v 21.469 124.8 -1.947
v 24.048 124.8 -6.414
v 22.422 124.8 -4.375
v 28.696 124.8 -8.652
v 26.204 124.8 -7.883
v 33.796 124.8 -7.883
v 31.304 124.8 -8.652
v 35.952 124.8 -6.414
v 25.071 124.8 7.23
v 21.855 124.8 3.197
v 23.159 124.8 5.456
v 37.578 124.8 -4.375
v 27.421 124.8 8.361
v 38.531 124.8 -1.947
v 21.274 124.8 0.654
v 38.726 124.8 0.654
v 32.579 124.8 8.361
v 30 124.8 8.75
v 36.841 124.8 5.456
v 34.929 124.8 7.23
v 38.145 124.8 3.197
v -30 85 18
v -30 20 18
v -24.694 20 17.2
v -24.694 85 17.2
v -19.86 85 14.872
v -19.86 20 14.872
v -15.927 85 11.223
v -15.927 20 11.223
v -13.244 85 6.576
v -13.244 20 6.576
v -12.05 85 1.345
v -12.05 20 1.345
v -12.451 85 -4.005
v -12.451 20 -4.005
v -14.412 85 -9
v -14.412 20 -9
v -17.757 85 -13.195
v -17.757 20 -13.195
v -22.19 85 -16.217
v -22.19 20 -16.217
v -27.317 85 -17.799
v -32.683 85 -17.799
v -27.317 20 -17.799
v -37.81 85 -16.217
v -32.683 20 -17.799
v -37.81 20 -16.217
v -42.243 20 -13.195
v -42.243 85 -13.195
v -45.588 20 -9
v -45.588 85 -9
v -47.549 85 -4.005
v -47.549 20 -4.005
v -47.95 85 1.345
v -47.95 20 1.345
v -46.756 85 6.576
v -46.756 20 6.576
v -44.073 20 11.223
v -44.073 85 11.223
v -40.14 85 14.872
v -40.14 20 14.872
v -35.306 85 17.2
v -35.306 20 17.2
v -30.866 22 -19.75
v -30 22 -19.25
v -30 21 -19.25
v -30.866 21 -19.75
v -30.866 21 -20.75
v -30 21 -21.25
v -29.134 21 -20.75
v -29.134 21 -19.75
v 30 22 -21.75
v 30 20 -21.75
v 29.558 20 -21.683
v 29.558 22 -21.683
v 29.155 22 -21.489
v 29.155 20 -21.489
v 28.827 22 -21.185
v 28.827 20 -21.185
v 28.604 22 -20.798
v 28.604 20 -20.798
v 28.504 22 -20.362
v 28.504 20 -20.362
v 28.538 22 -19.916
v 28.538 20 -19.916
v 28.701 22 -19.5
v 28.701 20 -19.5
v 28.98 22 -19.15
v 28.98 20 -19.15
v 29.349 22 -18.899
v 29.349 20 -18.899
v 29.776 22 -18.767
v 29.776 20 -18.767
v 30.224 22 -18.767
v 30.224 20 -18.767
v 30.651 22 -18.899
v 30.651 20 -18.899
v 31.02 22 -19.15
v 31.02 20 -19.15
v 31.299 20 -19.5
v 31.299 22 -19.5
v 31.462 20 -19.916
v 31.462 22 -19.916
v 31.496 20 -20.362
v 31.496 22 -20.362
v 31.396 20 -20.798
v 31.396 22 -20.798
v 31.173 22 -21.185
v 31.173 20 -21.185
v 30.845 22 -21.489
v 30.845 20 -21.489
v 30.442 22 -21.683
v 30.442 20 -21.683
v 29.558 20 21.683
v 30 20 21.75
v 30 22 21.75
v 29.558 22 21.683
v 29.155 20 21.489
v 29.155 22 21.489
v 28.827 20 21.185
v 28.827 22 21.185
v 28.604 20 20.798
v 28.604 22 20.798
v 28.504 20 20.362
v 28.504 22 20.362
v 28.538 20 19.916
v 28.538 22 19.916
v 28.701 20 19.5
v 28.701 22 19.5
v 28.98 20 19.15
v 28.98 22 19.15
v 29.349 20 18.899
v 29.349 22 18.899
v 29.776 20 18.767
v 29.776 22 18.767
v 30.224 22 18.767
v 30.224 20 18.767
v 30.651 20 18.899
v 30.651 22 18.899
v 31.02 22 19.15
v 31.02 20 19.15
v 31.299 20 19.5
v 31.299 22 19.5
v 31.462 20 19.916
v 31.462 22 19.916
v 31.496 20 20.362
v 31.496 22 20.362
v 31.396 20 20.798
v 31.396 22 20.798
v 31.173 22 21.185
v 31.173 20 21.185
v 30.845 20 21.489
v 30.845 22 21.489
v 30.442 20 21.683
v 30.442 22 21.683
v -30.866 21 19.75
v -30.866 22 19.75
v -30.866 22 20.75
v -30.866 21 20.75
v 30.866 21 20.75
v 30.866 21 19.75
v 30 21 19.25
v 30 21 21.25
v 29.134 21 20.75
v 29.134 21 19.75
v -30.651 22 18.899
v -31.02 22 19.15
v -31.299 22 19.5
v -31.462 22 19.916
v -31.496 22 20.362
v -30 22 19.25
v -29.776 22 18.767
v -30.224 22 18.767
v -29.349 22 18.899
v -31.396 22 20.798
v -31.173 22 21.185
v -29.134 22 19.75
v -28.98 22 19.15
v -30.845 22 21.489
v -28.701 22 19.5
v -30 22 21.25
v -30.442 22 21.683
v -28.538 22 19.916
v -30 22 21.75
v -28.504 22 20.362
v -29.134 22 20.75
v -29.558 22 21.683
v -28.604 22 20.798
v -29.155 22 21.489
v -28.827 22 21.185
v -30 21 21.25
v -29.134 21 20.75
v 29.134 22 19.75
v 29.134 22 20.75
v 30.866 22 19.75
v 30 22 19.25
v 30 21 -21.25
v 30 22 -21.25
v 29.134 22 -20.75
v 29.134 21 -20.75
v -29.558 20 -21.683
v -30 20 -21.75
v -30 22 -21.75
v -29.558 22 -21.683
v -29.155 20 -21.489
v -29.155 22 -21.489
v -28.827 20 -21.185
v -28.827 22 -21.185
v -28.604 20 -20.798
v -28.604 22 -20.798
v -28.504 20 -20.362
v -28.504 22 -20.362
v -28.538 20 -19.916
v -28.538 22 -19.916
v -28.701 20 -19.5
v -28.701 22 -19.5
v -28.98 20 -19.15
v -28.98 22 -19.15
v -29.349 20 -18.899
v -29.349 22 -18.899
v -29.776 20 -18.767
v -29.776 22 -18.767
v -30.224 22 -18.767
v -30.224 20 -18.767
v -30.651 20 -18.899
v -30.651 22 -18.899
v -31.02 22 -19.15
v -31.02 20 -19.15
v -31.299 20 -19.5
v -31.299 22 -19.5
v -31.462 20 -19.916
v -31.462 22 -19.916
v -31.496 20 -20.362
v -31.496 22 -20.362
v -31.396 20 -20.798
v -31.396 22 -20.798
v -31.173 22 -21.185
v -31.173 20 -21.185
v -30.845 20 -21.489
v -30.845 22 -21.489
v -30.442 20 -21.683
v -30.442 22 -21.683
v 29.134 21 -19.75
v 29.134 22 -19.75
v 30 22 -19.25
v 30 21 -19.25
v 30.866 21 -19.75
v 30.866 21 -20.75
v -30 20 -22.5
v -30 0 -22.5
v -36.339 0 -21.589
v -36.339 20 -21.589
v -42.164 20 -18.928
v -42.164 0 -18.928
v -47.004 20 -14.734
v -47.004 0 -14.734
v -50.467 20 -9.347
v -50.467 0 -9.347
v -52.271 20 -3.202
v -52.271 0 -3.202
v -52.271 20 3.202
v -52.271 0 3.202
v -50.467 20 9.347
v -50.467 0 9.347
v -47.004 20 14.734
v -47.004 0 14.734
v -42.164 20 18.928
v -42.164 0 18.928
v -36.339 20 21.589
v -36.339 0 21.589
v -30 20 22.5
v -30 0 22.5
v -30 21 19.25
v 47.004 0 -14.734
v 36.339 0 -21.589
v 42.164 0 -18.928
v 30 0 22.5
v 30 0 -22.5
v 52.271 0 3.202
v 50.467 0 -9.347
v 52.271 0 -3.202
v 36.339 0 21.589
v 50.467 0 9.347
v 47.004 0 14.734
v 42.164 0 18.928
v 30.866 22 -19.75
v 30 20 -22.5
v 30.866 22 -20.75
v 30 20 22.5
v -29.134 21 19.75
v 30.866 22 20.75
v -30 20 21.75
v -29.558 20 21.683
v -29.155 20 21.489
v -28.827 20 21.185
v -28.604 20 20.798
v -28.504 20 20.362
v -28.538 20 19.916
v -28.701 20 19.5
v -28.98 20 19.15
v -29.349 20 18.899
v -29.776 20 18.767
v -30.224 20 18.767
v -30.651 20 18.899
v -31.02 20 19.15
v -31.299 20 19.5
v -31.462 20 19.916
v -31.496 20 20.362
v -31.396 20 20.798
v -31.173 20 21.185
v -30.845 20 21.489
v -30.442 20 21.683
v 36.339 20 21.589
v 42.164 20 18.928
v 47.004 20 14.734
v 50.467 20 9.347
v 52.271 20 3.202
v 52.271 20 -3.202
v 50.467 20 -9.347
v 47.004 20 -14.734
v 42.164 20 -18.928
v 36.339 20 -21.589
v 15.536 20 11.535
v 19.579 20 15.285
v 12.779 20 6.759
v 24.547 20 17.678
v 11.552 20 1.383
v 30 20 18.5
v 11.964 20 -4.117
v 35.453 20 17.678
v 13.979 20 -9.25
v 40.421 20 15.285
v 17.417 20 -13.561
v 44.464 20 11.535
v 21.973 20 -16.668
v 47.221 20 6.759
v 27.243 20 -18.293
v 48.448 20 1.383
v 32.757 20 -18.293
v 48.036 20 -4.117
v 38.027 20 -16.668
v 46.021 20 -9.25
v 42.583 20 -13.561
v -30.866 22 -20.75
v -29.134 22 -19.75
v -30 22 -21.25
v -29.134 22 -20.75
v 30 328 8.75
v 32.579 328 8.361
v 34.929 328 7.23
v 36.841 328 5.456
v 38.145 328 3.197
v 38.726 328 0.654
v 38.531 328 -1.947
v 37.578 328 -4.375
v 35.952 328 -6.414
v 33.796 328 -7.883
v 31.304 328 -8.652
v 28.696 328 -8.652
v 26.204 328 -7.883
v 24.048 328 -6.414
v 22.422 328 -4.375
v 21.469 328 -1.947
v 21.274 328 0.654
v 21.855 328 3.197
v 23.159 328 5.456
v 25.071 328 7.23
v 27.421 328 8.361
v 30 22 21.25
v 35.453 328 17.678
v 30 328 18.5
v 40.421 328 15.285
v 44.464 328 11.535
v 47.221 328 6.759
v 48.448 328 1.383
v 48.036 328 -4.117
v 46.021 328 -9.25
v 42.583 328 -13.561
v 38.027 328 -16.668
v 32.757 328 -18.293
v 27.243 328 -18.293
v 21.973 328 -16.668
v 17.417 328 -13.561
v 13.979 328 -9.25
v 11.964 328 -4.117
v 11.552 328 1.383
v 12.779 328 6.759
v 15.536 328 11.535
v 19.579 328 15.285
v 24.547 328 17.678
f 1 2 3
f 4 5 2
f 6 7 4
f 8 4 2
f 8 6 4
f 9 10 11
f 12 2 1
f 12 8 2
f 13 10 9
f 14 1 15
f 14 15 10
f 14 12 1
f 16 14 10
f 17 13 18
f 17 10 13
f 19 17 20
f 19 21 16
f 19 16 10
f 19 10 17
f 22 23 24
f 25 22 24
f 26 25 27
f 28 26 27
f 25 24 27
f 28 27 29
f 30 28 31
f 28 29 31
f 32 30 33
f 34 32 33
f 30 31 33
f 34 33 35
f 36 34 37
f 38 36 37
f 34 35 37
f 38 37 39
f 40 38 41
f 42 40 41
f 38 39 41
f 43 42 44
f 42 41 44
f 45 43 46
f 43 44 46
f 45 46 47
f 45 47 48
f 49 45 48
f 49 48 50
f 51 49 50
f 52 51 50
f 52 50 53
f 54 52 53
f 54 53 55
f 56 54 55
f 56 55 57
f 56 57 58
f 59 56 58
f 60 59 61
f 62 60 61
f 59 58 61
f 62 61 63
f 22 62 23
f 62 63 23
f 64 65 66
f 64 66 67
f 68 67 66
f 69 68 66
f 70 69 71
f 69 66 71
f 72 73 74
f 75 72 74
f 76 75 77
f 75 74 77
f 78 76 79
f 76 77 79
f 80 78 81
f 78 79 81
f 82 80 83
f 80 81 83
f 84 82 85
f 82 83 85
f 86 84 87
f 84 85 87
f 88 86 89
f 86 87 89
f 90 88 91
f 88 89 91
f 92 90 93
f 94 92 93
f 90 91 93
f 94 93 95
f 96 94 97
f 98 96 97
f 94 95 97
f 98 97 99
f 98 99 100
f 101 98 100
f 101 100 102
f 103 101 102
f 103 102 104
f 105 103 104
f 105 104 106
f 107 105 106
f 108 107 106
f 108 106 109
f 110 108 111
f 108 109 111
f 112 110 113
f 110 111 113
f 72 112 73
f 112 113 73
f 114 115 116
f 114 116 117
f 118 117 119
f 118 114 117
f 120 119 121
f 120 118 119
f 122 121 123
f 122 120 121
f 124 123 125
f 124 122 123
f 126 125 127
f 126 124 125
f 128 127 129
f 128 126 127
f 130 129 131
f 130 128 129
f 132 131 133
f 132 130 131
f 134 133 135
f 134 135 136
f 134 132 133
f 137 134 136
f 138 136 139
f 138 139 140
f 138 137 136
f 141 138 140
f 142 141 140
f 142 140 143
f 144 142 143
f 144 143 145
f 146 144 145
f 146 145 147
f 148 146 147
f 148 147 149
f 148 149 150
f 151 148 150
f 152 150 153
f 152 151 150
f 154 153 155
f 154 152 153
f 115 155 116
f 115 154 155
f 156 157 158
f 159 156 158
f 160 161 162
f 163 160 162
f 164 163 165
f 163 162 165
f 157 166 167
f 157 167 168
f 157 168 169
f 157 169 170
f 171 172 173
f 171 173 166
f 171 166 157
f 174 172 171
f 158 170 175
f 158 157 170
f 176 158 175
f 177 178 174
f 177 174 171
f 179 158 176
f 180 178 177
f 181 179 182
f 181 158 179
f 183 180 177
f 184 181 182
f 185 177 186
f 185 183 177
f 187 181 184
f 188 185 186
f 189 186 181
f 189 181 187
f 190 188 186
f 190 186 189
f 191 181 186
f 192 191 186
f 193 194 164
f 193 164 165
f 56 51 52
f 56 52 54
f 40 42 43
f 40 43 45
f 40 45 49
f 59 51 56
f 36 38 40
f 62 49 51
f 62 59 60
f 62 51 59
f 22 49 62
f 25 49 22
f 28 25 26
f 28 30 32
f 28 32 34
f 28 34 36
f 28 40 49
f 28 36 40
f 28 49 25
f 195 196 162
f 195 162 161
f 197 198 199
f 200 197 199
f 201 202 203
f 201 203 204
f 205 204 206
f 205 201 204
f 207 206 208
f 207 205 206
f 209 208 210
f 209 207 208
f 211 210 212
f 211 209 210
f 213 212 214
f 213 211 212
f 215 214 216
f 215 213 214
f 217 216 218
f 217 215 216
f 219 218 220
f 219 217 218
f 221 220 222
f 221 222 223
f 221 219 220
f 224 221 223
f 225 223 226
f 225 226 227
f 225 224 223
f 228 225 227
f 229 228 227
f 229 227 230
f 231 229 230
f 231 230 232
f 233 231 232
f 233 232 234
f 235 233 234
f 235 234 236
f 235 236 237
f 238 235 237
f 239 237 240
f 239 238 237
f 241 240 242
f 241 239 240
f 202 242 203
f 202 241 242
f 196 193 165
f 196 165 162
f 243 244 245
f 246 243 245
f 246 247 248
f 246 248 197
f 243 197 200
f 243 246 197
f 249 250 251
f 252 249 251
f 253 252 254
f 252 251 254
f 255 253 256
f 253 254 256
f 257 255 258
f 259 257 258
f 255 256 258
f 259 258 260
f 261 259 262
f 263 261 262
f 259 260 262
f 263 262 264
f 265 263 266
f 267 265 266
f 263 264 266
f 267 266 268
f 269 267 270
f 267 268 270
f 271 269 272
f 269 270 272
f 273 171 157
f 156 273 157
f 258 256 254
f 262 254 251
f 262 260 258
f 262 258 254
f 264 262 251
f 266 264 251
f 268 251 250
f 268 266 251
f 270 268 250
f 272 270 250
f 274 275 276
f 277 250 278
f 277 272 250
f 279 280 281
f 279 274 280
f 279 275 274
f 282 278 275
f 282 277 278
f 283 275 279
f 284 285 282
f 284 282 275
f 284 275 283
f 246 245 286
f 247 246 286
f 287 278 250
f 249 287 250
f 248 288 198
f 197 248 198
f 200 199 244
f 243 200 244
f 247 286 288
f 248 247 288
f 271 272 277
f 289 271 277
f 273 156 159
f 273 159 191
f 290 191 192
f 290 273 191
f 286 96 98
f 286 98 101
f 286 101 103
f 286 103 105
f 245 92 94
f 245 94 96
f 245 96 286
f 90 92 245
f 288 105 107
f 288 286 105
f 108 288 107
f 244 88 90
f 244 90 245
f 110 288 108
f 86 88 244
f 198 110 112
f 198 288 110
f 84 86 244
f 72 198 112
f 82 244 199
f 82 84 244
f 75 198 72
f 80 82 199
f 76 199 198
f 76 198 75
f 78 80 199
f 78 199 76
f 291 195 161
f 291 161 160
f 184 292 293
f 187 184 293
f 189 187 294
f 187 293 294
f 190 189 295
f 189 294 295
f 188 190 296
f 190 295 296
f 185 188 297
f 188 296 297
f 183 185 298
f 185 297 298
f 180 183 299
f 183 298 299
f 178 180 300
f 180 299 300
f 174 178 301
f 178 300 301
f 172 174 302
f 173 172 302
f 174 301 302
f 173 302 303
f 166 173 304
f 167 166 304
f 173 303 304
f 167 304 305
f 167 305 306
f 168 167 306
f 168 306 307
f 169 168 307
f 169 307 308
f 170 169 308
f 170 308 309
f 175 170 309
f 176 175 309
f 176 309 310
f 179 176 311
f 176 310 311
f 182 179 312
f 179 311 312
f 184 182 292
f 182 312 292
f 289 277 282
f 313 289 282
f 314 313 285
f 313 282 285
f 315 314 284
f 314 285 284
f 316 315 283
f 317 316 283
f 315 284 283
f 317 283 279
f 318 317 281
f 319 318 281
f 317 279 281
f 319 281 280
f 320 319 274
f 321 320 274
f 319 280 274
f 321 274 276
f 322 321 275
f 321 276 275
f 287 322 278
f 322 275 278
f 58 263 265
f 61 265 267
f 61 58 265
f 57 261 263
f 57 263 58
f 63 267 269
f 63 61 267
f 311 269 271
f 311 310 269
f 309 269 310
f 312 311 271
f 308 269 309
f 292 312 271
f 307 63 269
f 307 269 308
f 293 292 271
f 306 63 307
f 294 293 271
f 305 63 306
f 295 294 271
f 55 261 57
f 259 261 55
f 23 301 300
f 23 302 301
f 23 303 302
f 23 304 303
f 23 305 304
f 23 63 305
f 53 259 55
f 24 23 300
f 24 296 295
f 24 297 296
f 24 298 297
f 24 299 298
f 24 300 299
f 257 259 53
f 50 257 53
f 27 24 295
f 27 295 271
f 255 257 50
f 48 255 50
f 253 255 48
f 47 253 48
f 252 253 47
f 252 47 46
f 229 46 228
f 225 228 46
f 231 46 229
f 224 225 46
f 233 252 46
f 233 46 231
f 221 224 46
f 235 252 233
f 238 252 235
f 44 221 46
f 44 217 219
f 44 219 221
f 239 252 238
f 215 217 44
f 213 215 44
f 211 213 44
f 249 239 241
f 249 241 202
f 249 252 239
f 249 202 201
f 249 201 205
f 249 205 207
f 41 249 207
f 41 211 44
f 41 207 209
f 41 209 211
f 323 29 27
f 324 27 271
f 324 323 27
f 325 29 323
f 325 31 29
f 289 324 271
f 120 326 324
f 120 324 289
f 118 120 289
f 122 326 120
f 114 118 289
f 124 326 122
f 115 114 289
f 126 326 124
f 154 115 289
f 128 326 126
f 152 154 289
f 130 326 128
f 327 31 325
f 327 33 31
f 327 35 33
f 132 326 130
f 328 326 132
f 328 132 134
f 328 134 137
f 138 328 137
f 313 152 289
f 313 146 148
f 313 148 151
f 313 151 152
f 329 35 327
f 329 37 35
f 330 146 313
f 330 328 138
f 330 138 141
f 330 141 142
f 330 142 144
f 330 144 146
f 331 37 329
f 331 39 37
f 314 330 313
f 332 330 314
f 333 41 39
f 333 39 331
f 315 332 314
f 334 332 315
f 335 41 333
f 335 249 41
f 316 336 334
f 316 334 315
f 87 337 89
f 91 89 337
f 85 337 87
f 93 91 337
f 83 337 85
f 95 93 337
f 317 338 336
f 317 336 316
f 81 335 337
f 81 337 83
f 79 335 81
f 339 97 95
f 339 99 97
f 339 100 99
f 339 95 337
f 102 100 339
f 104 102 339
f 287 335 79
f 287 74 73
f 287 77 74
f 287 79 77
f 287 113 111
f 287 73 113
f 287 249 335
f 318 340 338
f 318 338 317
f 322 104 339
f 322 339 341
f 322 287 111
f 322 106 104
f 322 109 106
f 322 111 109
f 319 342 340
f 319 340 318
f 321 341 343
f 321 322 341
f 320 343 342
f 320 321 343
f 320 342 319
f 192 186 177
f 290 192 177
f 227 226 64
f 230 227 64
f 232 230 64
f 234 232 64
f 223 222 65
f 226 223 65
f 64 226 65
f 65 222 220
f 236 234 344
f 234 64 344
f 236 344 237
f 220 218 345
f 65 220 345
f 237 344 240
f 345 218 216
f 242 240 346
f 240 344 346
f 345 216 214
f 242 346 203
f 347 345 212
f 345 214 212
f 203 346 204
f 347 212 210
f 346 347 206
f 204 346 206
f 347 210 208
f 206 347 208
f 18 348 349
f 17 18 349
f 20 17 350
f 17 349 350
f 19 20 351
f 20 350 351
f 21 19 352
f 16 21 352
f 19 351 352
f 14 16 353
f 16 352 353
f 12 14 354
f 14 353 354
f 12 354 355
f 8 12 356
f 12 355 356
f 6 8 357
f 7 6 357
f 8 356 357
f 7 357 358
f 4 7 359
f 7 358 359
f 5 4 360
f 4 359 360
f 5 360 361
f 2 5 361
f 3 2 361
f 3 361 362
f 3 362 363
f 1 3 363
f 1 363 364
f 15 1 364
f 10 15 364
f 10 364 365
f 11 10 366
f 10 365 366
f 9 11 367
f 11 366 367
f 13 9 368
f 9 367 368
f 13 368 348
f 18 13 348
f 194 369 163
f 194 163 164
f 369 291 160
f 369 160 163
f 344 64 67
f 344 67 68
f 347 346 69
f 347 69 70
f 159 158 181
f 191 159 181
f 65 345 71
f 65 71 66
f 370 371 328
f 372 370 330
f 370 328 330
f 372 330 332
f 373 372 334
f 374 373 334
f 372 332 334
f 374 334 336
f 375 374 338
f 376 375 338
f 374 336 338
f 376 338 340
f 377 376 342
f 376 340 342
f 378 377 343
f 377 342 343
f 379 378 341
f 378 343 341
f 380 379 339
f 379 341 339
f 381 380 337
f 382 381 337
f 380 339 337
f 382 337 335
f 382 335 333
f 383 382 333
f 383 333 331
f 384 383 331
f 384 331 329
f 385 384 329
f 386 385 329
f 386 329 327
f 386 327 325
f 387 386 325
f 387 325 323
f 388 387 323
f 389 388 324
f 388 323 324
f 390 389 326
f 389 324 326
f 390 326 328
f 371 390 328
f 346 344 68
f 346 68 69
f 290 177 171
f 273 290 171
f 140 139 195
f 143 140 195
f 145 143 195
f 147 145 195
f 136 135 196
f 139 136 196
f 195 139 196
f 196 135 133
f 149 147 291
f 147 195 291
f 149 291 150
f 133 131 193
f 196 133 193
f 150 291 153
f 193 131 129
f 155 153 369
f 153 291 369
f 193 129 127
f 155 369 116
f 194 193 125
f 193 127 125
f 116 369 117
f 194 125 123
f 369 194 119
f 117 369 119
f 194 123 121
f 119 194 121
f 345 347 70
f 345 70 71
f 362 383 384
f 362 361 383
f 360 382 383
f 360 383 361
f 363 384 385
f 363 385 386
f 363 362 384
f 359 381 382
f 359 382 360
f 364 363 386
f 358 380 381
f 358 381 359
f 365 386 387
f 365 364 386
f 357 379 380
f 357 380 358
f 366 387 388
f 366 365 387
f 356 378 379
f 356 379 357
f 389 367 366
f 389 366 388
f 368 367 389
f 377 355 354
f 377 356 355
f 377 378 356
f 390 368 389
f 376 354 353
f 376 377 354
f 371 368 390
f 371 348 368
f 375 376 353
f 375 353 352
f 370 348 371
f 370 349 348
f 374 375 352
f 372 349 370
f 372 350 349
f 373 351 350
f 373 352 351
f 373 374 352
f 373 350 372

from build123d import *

# Parameters (mm, degrees)
BOSS_EXTRUDE1_DEPTH     = 20
SKETCH2_R               = 18
BOSS_EXTRUDE2_DEPTH     = 65
SKETCH3_R               = 18.5
BOSS_EXTRUDE3_DEPTH     = 308
SKETCH4_R               = 8.75
CUT_EXTRUDE1_DEPTH      = 203.2
SKETCH8_R               = 1
CUT_EXTRUDE2_DEPTH      = 20
SKETCH9_R               = 1.5
BOSS_EXTRUDE4_DEPTH     = 2
CUT_EXTRUDE3_DEPTH      = 1
SKETCH11_R              = 1
BOSS_EXTRUDE5_DEPTH     = 20
MIRROR2_COPY_1_SKETCH_R = 1
MIRROR2_COPY_1_DEPTH    = 20
MIRROR2_COPY_2_SKETCH_R = 1.5
MIRROR2_COPY_2_DEPTH    = 2
MIRROR2_COPY_3_DEPTH    = 1
MIRROR2_COPY_4_SKETCH_R = 1
MIRROR2_COPY_4_DEPTH    = 20
MIRROR2_COPY_5_SKETCH_R = 1
MIRROR2_COPY_5_DEPTH    = 20
MIRROR2_COPY_6_SKETCH_R = 1
MIRROR2_COPY_6_DEPTH    = 20


with BuildPart() as part:
    # Sketch1 → Boss-Extrude1 (new body)
    with BuildSketch(Plane(origin=(0, 0, 0), x_dir=(1, 0, 0), z_dir=(0, 1, 0))):
        with BuildLine():
            Line((30, 22.5), (-30, 22.5))
            ThreePointArc((-30, 22.5), (-52.5, 0), (-30, -22.5))
            Line((-30, -22.5), (30, -22.5))
            ThreePointArc((30, -22.5), (52.5, 0), (30, 22.5))
        make_face()
    extrude(amount=BOSS_EXTRUDE1_DEPTH)

    # Sketch2 → Boss-Extrude2 (add)
    with BuildSketch(Plane(origin=(0, 20, 0), x_dir=(1, 0, 0), z_dir=(0, 1, 0))):
        with Locations(Location((-30, 0, 0), (0, 0, 270))):
            Circle(SKETCH2_R)
    extrude(amount=BOSS_EXTRUDE2_DEPTH)

    # Sketch3 → Boss-Extrude3 (add)
    with BuildSketch(Plane(origin=(0, 20, 0), x_dir=(1, 0, 0), z_dir=(0, 1, 0))):
        with Locations(Location((30, 0, 0), (0, 0, 270))):
            Circle(SKETCH3_R)
    extrude(amount=BOSS_EXTRUDE3_DEPTH)

    # Sketch4 → Cut-Extrude1 (cut)
    with BuildSketch(Plane(origin=(0, 328, 0), x_dir=(1, 0, 0), z_dir=(0, 1, 0))):
        with Locations(Location((30, 0, 0), (0, 0, 270))):
            Circle(SKETCH4_R)
    extrude(amount=-CUT_EXTRUDE1_DEPTH, mode=Mode.SUBTRACT)

    # Sketch8 → Cut-Extrude2 (cut)
    with BuildSketch(Plane(origin=(0, 20, 0), x_dir=(1, 0, 0), z_dir=(0, 1, 0))):
        with Locations(Location((-30, -20.25, 0), (0, 0, 270))):
            Circle(SKETCH8_R)
    cut_extrude2 = extrude(amount=-CUT_EXTRUDE2_DEPTH, mode=Mode.SUBTRACT)

    # Sketch9 → Boss-Extrude4 (add)
    with BuildSketch(Plane(origin=(0, 20, 0), x_dir=(1, 0, 0), z_dir=(0, 1, 0))):
        with Locations(Location((-30, -20.25, 0), (0, 0, 270))):
            Circle(SKETCH9_R)
    boss_extrude4 = extrude(amount=BOSS_EXTRUDE4_DEPTH)

    # Sketch10 → Cut-Extrude3 (cut)
    with BuildSketch(Plane(origin=(0, 22, 0), x_dir=(1, 0, 0), z_dir=(0, 1, 0))):
        Polygon((-29.133974596, -20.75), (-29.133974596, -19.75), (-30, -19.25), (-30.866025404, -19.75), (-30.866025404, -20.75), (-30, -21.25), align=None)
    cut_extrude3 = extrude(amount=-CUT_EXTRUDE3_DEPTH, mode=Mode.SUBTRACT)

    # Sketch11 → Boss-Extrude5 (add)
    with BuildSketch(Plane.XZ.offset(-20)):
        with Locations((-30, 20.25)):
            Circle(SKETCH11_R)
    boss_extrude5 = extrude(amount=BOSS_EXTRUDE5_DEPTH)

    # Mirror1: Cut-Extrude2, Boss-Extrude4, Cut-Extrude3, Boss-Extrude5 across plane
    add(cut_extrude2.mirror(Plane(origin=(0, 0, 0), x_dir=(0, 0, 1), z_dir=(1, 0, 0))), mode=Mode.SUBTRACT)
    add(boss_extrude4.mirror(Plane(origin=(0, 0, 0), x_dir=(0, 0, 1), z_dir=(1, 0, 0))))
    add(cut_extrude3.mirror(Plane(origin=(0, 0, 0), x_dir=(0, 0, 1), z_dir=(1, 0, 0))), mode=Mode.SUBTRACT)
    add(boss_extrude5.mirror(Plane(origin=(0, 0, 0), x_dir=(0, 0, 1), z_dir=(1, 0, 0))))

    # Mirror2: Boss-Extrude4, Cut-Extrude3 across plane
    add(boss_extrude4.mirror(Plane.XY))
    add(cut_extrude3.mirror(Plane.XY), mode=Mode.SUBTRACT)

    # Mirror2 copy 1 sketch → Mirror2 copy 1 (cut)
    with BuildSketch(Plane(origin=(0, 20, 0), x_dir=(-1, 0, 0), z_dir=(0, 1, 0))):
        with Locations(Location((-30, -20.25, 0), (0, 0, 270))):
            Circle(MIRROR2_COPY_1_SKETCH_R)
    extrude(amount=-MIRROR2_COPY_1_DEPTH, mode=Mode.SUBTRACT)

    # Mirror2 copy 2 sketch → Mirror2 copy 2 (add)
    with BuildSketch(Plane(origin=(0, 20, 0), x_dir=(-1, 0, 0), z_dir=(0, 1, 0))):
        with Locations(Location((-30, -20.25, 0), (0, 0, 270))):
            Circle(MIRROR2_COPY_2_SKETCH_R)
    extrude(amount=MIRROR2_COPY_2_DEPTH)

    # Mirror2 copy 3 sketch → Mirror2 copy 3 (cut)
    with BuildSketch(Plane(origin=(0, 22, 0), x_dir=(-1, 0, 0), z_dir=(0, 1, 0))):
        Polygon((-29.133974596, -20.75), (-29.133974596, -19.75), (-30, -19.25), (-30.866025404, -19.75), (-30.866025404, -20.75), (-30, -21.25), align=None)
    extrude(amount=-MIRROR2_COPY_3_DEPTH, mode=Mode.SUBTRACT)

    # Mirror2 copy 4 sketch → Mirror2 copy 4 (add)
    with BuildSketch(Plane(origin=(0, 20, 0), x_dir=(-1, 0, 0), z_dir=(0, -1, 0))):
        with Locations((-30, 20.25)):
            Circle(MIRROR2_COPY_4_SKETCH_R)
    extrude(amount=MIRROR2_COPY_4_DEPTH)

    # Mirror2 copy 5 sketch → Mirror2 copy 5 (cut)
    with BuildSketch(Plane(origin=(0, 20, 0), x_dir=(1, 0, 0), z_dir=(0, 1, 0))):
        with Locations((-30, 20.25)):
            Circle(MIRROR2_COPY_5_SKETCH_R)
    extrude(amount=-MIRROR2_COPY_5_DEPTH, mode=Mode.SUBTRACT)

    # Mirror2 copy 6 sketch → Mirror2 copy 6 (add)
    with BuildSketch(Plane.XZ.offset(-20)):
        with Locations((-30, -20.25)):
            Circle(MIRROR2_COPY_6_SKETCH_R)
    extrude(amount=MIRROR2_COPY_6_DEPTH)


solid = part.part
